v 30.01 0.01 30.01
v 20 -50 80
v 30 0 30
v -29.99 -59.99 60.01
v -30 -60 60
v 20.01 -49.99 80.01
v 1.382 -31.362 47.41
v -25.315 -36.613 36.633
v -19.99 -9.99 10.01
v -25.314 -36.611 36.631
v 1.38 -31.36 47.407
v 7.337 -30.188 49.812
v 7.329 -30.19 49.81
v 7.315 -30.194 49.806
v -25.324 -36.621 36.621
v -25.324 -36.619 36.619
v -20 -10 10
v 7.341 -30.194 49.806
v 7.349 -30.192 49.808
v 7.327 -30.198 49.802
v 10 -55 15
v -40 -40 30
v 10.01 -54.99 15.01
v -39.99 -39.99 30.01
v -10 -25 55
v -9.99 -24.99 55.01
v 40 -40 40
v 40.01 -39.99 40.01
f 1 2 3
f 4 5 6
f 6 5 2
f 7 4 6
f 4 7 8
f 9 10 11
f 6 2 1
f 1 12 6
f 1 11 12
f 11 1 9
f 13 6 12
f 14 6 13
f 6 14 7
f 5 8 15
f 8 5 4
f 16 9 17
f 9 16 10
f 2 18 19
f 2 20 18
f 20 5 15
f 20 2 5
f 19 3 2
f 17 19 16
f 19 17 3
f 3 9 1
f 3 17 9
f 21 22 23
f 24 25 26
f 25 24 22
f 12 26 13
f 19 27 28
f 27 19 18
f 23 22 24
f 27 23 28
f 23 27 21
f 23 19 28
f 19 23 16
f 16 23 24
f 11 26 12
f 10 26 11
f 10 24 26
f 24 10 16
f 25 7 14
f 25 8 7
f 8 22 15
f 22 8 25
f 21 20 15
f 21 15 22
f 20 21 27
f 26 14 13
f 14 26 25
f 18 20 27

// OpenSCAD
// file: deskriptiva.scad
module unitTriangle() {
	linear_extrude(0.01)
	polygon([[0, 0], [u, 0], [0, u]]);
}

module unitParallelogram() {
	linear_extrude(0.01)
	polygon([[0, 0], [u, 0], [0, u], [-u, u]]);
}

module unitPyramid(n) {
	step = 360 / n;
		hull() {
		for (i = [0: n]) {
			translate([cos(i*step) * u, sin(i*step) * u, 0]) cube(0.01, center=true);
		}
		translate([0, 0, u]) cube(0.01, center=true);
	}
}

module unitLine() {
	translate([u/2, 0, 0]) cube([u, 0.01, 0.01], center=true);
}

module magnify(thickness) {
	minkowski() {
		children();
		sphere(thickness);
	}
}

module transform(A, B, C) {
	// all y coords are switched
    dA = [0, 0, 0];
    dB = [B.x - A.x, - B.y + A.y, B.z - A.z];
    dC = [C.x - A.x, - C.y + A.y, C.z - A.z];
    m = [
        [dB.x, dC.x, 1, u*A.x],
        [dB.y, dC.y, 1, -u*A.y],
        [dB.z, dC.z, 1, u*A.z],
        [0, 0, 0, 1]
    ];
    
    multmatrix(m) children();
} 

module oneAxisTransform(S, A, V) {
	// all y coords are switched
    dS = [0, 0, 0];
    dA = [A.x - S.x, - A.y + S.y, A.z - S.z];
    dV = [V.x - S.x, - V.y + S.y, V.z - S.z];
	dANormal = cross([0, 0, 1], dA);
    m = [
        [dA.x, dANormal.x, dV.x, u*S.x],
        [dA.y, dANormal.y,dV.y, -u*S.y],
        [dA.z, dANormal.z, dV.z, u*S.z],
        [0, 0, 0, 1]
    ];
    
    multmatrix(m) children();
}
// main file
u = 10;
include<deskriptiva.scad>

color("Lime")
transform([-2, 1, 1], [3, 0, 3], [2, 5, 8])
unitParallelogram();

color("Yellow")
transform([-4, 4, 3], [-1, 2.5, 5.5], [4, 4, 4])
unitParallelogram();
